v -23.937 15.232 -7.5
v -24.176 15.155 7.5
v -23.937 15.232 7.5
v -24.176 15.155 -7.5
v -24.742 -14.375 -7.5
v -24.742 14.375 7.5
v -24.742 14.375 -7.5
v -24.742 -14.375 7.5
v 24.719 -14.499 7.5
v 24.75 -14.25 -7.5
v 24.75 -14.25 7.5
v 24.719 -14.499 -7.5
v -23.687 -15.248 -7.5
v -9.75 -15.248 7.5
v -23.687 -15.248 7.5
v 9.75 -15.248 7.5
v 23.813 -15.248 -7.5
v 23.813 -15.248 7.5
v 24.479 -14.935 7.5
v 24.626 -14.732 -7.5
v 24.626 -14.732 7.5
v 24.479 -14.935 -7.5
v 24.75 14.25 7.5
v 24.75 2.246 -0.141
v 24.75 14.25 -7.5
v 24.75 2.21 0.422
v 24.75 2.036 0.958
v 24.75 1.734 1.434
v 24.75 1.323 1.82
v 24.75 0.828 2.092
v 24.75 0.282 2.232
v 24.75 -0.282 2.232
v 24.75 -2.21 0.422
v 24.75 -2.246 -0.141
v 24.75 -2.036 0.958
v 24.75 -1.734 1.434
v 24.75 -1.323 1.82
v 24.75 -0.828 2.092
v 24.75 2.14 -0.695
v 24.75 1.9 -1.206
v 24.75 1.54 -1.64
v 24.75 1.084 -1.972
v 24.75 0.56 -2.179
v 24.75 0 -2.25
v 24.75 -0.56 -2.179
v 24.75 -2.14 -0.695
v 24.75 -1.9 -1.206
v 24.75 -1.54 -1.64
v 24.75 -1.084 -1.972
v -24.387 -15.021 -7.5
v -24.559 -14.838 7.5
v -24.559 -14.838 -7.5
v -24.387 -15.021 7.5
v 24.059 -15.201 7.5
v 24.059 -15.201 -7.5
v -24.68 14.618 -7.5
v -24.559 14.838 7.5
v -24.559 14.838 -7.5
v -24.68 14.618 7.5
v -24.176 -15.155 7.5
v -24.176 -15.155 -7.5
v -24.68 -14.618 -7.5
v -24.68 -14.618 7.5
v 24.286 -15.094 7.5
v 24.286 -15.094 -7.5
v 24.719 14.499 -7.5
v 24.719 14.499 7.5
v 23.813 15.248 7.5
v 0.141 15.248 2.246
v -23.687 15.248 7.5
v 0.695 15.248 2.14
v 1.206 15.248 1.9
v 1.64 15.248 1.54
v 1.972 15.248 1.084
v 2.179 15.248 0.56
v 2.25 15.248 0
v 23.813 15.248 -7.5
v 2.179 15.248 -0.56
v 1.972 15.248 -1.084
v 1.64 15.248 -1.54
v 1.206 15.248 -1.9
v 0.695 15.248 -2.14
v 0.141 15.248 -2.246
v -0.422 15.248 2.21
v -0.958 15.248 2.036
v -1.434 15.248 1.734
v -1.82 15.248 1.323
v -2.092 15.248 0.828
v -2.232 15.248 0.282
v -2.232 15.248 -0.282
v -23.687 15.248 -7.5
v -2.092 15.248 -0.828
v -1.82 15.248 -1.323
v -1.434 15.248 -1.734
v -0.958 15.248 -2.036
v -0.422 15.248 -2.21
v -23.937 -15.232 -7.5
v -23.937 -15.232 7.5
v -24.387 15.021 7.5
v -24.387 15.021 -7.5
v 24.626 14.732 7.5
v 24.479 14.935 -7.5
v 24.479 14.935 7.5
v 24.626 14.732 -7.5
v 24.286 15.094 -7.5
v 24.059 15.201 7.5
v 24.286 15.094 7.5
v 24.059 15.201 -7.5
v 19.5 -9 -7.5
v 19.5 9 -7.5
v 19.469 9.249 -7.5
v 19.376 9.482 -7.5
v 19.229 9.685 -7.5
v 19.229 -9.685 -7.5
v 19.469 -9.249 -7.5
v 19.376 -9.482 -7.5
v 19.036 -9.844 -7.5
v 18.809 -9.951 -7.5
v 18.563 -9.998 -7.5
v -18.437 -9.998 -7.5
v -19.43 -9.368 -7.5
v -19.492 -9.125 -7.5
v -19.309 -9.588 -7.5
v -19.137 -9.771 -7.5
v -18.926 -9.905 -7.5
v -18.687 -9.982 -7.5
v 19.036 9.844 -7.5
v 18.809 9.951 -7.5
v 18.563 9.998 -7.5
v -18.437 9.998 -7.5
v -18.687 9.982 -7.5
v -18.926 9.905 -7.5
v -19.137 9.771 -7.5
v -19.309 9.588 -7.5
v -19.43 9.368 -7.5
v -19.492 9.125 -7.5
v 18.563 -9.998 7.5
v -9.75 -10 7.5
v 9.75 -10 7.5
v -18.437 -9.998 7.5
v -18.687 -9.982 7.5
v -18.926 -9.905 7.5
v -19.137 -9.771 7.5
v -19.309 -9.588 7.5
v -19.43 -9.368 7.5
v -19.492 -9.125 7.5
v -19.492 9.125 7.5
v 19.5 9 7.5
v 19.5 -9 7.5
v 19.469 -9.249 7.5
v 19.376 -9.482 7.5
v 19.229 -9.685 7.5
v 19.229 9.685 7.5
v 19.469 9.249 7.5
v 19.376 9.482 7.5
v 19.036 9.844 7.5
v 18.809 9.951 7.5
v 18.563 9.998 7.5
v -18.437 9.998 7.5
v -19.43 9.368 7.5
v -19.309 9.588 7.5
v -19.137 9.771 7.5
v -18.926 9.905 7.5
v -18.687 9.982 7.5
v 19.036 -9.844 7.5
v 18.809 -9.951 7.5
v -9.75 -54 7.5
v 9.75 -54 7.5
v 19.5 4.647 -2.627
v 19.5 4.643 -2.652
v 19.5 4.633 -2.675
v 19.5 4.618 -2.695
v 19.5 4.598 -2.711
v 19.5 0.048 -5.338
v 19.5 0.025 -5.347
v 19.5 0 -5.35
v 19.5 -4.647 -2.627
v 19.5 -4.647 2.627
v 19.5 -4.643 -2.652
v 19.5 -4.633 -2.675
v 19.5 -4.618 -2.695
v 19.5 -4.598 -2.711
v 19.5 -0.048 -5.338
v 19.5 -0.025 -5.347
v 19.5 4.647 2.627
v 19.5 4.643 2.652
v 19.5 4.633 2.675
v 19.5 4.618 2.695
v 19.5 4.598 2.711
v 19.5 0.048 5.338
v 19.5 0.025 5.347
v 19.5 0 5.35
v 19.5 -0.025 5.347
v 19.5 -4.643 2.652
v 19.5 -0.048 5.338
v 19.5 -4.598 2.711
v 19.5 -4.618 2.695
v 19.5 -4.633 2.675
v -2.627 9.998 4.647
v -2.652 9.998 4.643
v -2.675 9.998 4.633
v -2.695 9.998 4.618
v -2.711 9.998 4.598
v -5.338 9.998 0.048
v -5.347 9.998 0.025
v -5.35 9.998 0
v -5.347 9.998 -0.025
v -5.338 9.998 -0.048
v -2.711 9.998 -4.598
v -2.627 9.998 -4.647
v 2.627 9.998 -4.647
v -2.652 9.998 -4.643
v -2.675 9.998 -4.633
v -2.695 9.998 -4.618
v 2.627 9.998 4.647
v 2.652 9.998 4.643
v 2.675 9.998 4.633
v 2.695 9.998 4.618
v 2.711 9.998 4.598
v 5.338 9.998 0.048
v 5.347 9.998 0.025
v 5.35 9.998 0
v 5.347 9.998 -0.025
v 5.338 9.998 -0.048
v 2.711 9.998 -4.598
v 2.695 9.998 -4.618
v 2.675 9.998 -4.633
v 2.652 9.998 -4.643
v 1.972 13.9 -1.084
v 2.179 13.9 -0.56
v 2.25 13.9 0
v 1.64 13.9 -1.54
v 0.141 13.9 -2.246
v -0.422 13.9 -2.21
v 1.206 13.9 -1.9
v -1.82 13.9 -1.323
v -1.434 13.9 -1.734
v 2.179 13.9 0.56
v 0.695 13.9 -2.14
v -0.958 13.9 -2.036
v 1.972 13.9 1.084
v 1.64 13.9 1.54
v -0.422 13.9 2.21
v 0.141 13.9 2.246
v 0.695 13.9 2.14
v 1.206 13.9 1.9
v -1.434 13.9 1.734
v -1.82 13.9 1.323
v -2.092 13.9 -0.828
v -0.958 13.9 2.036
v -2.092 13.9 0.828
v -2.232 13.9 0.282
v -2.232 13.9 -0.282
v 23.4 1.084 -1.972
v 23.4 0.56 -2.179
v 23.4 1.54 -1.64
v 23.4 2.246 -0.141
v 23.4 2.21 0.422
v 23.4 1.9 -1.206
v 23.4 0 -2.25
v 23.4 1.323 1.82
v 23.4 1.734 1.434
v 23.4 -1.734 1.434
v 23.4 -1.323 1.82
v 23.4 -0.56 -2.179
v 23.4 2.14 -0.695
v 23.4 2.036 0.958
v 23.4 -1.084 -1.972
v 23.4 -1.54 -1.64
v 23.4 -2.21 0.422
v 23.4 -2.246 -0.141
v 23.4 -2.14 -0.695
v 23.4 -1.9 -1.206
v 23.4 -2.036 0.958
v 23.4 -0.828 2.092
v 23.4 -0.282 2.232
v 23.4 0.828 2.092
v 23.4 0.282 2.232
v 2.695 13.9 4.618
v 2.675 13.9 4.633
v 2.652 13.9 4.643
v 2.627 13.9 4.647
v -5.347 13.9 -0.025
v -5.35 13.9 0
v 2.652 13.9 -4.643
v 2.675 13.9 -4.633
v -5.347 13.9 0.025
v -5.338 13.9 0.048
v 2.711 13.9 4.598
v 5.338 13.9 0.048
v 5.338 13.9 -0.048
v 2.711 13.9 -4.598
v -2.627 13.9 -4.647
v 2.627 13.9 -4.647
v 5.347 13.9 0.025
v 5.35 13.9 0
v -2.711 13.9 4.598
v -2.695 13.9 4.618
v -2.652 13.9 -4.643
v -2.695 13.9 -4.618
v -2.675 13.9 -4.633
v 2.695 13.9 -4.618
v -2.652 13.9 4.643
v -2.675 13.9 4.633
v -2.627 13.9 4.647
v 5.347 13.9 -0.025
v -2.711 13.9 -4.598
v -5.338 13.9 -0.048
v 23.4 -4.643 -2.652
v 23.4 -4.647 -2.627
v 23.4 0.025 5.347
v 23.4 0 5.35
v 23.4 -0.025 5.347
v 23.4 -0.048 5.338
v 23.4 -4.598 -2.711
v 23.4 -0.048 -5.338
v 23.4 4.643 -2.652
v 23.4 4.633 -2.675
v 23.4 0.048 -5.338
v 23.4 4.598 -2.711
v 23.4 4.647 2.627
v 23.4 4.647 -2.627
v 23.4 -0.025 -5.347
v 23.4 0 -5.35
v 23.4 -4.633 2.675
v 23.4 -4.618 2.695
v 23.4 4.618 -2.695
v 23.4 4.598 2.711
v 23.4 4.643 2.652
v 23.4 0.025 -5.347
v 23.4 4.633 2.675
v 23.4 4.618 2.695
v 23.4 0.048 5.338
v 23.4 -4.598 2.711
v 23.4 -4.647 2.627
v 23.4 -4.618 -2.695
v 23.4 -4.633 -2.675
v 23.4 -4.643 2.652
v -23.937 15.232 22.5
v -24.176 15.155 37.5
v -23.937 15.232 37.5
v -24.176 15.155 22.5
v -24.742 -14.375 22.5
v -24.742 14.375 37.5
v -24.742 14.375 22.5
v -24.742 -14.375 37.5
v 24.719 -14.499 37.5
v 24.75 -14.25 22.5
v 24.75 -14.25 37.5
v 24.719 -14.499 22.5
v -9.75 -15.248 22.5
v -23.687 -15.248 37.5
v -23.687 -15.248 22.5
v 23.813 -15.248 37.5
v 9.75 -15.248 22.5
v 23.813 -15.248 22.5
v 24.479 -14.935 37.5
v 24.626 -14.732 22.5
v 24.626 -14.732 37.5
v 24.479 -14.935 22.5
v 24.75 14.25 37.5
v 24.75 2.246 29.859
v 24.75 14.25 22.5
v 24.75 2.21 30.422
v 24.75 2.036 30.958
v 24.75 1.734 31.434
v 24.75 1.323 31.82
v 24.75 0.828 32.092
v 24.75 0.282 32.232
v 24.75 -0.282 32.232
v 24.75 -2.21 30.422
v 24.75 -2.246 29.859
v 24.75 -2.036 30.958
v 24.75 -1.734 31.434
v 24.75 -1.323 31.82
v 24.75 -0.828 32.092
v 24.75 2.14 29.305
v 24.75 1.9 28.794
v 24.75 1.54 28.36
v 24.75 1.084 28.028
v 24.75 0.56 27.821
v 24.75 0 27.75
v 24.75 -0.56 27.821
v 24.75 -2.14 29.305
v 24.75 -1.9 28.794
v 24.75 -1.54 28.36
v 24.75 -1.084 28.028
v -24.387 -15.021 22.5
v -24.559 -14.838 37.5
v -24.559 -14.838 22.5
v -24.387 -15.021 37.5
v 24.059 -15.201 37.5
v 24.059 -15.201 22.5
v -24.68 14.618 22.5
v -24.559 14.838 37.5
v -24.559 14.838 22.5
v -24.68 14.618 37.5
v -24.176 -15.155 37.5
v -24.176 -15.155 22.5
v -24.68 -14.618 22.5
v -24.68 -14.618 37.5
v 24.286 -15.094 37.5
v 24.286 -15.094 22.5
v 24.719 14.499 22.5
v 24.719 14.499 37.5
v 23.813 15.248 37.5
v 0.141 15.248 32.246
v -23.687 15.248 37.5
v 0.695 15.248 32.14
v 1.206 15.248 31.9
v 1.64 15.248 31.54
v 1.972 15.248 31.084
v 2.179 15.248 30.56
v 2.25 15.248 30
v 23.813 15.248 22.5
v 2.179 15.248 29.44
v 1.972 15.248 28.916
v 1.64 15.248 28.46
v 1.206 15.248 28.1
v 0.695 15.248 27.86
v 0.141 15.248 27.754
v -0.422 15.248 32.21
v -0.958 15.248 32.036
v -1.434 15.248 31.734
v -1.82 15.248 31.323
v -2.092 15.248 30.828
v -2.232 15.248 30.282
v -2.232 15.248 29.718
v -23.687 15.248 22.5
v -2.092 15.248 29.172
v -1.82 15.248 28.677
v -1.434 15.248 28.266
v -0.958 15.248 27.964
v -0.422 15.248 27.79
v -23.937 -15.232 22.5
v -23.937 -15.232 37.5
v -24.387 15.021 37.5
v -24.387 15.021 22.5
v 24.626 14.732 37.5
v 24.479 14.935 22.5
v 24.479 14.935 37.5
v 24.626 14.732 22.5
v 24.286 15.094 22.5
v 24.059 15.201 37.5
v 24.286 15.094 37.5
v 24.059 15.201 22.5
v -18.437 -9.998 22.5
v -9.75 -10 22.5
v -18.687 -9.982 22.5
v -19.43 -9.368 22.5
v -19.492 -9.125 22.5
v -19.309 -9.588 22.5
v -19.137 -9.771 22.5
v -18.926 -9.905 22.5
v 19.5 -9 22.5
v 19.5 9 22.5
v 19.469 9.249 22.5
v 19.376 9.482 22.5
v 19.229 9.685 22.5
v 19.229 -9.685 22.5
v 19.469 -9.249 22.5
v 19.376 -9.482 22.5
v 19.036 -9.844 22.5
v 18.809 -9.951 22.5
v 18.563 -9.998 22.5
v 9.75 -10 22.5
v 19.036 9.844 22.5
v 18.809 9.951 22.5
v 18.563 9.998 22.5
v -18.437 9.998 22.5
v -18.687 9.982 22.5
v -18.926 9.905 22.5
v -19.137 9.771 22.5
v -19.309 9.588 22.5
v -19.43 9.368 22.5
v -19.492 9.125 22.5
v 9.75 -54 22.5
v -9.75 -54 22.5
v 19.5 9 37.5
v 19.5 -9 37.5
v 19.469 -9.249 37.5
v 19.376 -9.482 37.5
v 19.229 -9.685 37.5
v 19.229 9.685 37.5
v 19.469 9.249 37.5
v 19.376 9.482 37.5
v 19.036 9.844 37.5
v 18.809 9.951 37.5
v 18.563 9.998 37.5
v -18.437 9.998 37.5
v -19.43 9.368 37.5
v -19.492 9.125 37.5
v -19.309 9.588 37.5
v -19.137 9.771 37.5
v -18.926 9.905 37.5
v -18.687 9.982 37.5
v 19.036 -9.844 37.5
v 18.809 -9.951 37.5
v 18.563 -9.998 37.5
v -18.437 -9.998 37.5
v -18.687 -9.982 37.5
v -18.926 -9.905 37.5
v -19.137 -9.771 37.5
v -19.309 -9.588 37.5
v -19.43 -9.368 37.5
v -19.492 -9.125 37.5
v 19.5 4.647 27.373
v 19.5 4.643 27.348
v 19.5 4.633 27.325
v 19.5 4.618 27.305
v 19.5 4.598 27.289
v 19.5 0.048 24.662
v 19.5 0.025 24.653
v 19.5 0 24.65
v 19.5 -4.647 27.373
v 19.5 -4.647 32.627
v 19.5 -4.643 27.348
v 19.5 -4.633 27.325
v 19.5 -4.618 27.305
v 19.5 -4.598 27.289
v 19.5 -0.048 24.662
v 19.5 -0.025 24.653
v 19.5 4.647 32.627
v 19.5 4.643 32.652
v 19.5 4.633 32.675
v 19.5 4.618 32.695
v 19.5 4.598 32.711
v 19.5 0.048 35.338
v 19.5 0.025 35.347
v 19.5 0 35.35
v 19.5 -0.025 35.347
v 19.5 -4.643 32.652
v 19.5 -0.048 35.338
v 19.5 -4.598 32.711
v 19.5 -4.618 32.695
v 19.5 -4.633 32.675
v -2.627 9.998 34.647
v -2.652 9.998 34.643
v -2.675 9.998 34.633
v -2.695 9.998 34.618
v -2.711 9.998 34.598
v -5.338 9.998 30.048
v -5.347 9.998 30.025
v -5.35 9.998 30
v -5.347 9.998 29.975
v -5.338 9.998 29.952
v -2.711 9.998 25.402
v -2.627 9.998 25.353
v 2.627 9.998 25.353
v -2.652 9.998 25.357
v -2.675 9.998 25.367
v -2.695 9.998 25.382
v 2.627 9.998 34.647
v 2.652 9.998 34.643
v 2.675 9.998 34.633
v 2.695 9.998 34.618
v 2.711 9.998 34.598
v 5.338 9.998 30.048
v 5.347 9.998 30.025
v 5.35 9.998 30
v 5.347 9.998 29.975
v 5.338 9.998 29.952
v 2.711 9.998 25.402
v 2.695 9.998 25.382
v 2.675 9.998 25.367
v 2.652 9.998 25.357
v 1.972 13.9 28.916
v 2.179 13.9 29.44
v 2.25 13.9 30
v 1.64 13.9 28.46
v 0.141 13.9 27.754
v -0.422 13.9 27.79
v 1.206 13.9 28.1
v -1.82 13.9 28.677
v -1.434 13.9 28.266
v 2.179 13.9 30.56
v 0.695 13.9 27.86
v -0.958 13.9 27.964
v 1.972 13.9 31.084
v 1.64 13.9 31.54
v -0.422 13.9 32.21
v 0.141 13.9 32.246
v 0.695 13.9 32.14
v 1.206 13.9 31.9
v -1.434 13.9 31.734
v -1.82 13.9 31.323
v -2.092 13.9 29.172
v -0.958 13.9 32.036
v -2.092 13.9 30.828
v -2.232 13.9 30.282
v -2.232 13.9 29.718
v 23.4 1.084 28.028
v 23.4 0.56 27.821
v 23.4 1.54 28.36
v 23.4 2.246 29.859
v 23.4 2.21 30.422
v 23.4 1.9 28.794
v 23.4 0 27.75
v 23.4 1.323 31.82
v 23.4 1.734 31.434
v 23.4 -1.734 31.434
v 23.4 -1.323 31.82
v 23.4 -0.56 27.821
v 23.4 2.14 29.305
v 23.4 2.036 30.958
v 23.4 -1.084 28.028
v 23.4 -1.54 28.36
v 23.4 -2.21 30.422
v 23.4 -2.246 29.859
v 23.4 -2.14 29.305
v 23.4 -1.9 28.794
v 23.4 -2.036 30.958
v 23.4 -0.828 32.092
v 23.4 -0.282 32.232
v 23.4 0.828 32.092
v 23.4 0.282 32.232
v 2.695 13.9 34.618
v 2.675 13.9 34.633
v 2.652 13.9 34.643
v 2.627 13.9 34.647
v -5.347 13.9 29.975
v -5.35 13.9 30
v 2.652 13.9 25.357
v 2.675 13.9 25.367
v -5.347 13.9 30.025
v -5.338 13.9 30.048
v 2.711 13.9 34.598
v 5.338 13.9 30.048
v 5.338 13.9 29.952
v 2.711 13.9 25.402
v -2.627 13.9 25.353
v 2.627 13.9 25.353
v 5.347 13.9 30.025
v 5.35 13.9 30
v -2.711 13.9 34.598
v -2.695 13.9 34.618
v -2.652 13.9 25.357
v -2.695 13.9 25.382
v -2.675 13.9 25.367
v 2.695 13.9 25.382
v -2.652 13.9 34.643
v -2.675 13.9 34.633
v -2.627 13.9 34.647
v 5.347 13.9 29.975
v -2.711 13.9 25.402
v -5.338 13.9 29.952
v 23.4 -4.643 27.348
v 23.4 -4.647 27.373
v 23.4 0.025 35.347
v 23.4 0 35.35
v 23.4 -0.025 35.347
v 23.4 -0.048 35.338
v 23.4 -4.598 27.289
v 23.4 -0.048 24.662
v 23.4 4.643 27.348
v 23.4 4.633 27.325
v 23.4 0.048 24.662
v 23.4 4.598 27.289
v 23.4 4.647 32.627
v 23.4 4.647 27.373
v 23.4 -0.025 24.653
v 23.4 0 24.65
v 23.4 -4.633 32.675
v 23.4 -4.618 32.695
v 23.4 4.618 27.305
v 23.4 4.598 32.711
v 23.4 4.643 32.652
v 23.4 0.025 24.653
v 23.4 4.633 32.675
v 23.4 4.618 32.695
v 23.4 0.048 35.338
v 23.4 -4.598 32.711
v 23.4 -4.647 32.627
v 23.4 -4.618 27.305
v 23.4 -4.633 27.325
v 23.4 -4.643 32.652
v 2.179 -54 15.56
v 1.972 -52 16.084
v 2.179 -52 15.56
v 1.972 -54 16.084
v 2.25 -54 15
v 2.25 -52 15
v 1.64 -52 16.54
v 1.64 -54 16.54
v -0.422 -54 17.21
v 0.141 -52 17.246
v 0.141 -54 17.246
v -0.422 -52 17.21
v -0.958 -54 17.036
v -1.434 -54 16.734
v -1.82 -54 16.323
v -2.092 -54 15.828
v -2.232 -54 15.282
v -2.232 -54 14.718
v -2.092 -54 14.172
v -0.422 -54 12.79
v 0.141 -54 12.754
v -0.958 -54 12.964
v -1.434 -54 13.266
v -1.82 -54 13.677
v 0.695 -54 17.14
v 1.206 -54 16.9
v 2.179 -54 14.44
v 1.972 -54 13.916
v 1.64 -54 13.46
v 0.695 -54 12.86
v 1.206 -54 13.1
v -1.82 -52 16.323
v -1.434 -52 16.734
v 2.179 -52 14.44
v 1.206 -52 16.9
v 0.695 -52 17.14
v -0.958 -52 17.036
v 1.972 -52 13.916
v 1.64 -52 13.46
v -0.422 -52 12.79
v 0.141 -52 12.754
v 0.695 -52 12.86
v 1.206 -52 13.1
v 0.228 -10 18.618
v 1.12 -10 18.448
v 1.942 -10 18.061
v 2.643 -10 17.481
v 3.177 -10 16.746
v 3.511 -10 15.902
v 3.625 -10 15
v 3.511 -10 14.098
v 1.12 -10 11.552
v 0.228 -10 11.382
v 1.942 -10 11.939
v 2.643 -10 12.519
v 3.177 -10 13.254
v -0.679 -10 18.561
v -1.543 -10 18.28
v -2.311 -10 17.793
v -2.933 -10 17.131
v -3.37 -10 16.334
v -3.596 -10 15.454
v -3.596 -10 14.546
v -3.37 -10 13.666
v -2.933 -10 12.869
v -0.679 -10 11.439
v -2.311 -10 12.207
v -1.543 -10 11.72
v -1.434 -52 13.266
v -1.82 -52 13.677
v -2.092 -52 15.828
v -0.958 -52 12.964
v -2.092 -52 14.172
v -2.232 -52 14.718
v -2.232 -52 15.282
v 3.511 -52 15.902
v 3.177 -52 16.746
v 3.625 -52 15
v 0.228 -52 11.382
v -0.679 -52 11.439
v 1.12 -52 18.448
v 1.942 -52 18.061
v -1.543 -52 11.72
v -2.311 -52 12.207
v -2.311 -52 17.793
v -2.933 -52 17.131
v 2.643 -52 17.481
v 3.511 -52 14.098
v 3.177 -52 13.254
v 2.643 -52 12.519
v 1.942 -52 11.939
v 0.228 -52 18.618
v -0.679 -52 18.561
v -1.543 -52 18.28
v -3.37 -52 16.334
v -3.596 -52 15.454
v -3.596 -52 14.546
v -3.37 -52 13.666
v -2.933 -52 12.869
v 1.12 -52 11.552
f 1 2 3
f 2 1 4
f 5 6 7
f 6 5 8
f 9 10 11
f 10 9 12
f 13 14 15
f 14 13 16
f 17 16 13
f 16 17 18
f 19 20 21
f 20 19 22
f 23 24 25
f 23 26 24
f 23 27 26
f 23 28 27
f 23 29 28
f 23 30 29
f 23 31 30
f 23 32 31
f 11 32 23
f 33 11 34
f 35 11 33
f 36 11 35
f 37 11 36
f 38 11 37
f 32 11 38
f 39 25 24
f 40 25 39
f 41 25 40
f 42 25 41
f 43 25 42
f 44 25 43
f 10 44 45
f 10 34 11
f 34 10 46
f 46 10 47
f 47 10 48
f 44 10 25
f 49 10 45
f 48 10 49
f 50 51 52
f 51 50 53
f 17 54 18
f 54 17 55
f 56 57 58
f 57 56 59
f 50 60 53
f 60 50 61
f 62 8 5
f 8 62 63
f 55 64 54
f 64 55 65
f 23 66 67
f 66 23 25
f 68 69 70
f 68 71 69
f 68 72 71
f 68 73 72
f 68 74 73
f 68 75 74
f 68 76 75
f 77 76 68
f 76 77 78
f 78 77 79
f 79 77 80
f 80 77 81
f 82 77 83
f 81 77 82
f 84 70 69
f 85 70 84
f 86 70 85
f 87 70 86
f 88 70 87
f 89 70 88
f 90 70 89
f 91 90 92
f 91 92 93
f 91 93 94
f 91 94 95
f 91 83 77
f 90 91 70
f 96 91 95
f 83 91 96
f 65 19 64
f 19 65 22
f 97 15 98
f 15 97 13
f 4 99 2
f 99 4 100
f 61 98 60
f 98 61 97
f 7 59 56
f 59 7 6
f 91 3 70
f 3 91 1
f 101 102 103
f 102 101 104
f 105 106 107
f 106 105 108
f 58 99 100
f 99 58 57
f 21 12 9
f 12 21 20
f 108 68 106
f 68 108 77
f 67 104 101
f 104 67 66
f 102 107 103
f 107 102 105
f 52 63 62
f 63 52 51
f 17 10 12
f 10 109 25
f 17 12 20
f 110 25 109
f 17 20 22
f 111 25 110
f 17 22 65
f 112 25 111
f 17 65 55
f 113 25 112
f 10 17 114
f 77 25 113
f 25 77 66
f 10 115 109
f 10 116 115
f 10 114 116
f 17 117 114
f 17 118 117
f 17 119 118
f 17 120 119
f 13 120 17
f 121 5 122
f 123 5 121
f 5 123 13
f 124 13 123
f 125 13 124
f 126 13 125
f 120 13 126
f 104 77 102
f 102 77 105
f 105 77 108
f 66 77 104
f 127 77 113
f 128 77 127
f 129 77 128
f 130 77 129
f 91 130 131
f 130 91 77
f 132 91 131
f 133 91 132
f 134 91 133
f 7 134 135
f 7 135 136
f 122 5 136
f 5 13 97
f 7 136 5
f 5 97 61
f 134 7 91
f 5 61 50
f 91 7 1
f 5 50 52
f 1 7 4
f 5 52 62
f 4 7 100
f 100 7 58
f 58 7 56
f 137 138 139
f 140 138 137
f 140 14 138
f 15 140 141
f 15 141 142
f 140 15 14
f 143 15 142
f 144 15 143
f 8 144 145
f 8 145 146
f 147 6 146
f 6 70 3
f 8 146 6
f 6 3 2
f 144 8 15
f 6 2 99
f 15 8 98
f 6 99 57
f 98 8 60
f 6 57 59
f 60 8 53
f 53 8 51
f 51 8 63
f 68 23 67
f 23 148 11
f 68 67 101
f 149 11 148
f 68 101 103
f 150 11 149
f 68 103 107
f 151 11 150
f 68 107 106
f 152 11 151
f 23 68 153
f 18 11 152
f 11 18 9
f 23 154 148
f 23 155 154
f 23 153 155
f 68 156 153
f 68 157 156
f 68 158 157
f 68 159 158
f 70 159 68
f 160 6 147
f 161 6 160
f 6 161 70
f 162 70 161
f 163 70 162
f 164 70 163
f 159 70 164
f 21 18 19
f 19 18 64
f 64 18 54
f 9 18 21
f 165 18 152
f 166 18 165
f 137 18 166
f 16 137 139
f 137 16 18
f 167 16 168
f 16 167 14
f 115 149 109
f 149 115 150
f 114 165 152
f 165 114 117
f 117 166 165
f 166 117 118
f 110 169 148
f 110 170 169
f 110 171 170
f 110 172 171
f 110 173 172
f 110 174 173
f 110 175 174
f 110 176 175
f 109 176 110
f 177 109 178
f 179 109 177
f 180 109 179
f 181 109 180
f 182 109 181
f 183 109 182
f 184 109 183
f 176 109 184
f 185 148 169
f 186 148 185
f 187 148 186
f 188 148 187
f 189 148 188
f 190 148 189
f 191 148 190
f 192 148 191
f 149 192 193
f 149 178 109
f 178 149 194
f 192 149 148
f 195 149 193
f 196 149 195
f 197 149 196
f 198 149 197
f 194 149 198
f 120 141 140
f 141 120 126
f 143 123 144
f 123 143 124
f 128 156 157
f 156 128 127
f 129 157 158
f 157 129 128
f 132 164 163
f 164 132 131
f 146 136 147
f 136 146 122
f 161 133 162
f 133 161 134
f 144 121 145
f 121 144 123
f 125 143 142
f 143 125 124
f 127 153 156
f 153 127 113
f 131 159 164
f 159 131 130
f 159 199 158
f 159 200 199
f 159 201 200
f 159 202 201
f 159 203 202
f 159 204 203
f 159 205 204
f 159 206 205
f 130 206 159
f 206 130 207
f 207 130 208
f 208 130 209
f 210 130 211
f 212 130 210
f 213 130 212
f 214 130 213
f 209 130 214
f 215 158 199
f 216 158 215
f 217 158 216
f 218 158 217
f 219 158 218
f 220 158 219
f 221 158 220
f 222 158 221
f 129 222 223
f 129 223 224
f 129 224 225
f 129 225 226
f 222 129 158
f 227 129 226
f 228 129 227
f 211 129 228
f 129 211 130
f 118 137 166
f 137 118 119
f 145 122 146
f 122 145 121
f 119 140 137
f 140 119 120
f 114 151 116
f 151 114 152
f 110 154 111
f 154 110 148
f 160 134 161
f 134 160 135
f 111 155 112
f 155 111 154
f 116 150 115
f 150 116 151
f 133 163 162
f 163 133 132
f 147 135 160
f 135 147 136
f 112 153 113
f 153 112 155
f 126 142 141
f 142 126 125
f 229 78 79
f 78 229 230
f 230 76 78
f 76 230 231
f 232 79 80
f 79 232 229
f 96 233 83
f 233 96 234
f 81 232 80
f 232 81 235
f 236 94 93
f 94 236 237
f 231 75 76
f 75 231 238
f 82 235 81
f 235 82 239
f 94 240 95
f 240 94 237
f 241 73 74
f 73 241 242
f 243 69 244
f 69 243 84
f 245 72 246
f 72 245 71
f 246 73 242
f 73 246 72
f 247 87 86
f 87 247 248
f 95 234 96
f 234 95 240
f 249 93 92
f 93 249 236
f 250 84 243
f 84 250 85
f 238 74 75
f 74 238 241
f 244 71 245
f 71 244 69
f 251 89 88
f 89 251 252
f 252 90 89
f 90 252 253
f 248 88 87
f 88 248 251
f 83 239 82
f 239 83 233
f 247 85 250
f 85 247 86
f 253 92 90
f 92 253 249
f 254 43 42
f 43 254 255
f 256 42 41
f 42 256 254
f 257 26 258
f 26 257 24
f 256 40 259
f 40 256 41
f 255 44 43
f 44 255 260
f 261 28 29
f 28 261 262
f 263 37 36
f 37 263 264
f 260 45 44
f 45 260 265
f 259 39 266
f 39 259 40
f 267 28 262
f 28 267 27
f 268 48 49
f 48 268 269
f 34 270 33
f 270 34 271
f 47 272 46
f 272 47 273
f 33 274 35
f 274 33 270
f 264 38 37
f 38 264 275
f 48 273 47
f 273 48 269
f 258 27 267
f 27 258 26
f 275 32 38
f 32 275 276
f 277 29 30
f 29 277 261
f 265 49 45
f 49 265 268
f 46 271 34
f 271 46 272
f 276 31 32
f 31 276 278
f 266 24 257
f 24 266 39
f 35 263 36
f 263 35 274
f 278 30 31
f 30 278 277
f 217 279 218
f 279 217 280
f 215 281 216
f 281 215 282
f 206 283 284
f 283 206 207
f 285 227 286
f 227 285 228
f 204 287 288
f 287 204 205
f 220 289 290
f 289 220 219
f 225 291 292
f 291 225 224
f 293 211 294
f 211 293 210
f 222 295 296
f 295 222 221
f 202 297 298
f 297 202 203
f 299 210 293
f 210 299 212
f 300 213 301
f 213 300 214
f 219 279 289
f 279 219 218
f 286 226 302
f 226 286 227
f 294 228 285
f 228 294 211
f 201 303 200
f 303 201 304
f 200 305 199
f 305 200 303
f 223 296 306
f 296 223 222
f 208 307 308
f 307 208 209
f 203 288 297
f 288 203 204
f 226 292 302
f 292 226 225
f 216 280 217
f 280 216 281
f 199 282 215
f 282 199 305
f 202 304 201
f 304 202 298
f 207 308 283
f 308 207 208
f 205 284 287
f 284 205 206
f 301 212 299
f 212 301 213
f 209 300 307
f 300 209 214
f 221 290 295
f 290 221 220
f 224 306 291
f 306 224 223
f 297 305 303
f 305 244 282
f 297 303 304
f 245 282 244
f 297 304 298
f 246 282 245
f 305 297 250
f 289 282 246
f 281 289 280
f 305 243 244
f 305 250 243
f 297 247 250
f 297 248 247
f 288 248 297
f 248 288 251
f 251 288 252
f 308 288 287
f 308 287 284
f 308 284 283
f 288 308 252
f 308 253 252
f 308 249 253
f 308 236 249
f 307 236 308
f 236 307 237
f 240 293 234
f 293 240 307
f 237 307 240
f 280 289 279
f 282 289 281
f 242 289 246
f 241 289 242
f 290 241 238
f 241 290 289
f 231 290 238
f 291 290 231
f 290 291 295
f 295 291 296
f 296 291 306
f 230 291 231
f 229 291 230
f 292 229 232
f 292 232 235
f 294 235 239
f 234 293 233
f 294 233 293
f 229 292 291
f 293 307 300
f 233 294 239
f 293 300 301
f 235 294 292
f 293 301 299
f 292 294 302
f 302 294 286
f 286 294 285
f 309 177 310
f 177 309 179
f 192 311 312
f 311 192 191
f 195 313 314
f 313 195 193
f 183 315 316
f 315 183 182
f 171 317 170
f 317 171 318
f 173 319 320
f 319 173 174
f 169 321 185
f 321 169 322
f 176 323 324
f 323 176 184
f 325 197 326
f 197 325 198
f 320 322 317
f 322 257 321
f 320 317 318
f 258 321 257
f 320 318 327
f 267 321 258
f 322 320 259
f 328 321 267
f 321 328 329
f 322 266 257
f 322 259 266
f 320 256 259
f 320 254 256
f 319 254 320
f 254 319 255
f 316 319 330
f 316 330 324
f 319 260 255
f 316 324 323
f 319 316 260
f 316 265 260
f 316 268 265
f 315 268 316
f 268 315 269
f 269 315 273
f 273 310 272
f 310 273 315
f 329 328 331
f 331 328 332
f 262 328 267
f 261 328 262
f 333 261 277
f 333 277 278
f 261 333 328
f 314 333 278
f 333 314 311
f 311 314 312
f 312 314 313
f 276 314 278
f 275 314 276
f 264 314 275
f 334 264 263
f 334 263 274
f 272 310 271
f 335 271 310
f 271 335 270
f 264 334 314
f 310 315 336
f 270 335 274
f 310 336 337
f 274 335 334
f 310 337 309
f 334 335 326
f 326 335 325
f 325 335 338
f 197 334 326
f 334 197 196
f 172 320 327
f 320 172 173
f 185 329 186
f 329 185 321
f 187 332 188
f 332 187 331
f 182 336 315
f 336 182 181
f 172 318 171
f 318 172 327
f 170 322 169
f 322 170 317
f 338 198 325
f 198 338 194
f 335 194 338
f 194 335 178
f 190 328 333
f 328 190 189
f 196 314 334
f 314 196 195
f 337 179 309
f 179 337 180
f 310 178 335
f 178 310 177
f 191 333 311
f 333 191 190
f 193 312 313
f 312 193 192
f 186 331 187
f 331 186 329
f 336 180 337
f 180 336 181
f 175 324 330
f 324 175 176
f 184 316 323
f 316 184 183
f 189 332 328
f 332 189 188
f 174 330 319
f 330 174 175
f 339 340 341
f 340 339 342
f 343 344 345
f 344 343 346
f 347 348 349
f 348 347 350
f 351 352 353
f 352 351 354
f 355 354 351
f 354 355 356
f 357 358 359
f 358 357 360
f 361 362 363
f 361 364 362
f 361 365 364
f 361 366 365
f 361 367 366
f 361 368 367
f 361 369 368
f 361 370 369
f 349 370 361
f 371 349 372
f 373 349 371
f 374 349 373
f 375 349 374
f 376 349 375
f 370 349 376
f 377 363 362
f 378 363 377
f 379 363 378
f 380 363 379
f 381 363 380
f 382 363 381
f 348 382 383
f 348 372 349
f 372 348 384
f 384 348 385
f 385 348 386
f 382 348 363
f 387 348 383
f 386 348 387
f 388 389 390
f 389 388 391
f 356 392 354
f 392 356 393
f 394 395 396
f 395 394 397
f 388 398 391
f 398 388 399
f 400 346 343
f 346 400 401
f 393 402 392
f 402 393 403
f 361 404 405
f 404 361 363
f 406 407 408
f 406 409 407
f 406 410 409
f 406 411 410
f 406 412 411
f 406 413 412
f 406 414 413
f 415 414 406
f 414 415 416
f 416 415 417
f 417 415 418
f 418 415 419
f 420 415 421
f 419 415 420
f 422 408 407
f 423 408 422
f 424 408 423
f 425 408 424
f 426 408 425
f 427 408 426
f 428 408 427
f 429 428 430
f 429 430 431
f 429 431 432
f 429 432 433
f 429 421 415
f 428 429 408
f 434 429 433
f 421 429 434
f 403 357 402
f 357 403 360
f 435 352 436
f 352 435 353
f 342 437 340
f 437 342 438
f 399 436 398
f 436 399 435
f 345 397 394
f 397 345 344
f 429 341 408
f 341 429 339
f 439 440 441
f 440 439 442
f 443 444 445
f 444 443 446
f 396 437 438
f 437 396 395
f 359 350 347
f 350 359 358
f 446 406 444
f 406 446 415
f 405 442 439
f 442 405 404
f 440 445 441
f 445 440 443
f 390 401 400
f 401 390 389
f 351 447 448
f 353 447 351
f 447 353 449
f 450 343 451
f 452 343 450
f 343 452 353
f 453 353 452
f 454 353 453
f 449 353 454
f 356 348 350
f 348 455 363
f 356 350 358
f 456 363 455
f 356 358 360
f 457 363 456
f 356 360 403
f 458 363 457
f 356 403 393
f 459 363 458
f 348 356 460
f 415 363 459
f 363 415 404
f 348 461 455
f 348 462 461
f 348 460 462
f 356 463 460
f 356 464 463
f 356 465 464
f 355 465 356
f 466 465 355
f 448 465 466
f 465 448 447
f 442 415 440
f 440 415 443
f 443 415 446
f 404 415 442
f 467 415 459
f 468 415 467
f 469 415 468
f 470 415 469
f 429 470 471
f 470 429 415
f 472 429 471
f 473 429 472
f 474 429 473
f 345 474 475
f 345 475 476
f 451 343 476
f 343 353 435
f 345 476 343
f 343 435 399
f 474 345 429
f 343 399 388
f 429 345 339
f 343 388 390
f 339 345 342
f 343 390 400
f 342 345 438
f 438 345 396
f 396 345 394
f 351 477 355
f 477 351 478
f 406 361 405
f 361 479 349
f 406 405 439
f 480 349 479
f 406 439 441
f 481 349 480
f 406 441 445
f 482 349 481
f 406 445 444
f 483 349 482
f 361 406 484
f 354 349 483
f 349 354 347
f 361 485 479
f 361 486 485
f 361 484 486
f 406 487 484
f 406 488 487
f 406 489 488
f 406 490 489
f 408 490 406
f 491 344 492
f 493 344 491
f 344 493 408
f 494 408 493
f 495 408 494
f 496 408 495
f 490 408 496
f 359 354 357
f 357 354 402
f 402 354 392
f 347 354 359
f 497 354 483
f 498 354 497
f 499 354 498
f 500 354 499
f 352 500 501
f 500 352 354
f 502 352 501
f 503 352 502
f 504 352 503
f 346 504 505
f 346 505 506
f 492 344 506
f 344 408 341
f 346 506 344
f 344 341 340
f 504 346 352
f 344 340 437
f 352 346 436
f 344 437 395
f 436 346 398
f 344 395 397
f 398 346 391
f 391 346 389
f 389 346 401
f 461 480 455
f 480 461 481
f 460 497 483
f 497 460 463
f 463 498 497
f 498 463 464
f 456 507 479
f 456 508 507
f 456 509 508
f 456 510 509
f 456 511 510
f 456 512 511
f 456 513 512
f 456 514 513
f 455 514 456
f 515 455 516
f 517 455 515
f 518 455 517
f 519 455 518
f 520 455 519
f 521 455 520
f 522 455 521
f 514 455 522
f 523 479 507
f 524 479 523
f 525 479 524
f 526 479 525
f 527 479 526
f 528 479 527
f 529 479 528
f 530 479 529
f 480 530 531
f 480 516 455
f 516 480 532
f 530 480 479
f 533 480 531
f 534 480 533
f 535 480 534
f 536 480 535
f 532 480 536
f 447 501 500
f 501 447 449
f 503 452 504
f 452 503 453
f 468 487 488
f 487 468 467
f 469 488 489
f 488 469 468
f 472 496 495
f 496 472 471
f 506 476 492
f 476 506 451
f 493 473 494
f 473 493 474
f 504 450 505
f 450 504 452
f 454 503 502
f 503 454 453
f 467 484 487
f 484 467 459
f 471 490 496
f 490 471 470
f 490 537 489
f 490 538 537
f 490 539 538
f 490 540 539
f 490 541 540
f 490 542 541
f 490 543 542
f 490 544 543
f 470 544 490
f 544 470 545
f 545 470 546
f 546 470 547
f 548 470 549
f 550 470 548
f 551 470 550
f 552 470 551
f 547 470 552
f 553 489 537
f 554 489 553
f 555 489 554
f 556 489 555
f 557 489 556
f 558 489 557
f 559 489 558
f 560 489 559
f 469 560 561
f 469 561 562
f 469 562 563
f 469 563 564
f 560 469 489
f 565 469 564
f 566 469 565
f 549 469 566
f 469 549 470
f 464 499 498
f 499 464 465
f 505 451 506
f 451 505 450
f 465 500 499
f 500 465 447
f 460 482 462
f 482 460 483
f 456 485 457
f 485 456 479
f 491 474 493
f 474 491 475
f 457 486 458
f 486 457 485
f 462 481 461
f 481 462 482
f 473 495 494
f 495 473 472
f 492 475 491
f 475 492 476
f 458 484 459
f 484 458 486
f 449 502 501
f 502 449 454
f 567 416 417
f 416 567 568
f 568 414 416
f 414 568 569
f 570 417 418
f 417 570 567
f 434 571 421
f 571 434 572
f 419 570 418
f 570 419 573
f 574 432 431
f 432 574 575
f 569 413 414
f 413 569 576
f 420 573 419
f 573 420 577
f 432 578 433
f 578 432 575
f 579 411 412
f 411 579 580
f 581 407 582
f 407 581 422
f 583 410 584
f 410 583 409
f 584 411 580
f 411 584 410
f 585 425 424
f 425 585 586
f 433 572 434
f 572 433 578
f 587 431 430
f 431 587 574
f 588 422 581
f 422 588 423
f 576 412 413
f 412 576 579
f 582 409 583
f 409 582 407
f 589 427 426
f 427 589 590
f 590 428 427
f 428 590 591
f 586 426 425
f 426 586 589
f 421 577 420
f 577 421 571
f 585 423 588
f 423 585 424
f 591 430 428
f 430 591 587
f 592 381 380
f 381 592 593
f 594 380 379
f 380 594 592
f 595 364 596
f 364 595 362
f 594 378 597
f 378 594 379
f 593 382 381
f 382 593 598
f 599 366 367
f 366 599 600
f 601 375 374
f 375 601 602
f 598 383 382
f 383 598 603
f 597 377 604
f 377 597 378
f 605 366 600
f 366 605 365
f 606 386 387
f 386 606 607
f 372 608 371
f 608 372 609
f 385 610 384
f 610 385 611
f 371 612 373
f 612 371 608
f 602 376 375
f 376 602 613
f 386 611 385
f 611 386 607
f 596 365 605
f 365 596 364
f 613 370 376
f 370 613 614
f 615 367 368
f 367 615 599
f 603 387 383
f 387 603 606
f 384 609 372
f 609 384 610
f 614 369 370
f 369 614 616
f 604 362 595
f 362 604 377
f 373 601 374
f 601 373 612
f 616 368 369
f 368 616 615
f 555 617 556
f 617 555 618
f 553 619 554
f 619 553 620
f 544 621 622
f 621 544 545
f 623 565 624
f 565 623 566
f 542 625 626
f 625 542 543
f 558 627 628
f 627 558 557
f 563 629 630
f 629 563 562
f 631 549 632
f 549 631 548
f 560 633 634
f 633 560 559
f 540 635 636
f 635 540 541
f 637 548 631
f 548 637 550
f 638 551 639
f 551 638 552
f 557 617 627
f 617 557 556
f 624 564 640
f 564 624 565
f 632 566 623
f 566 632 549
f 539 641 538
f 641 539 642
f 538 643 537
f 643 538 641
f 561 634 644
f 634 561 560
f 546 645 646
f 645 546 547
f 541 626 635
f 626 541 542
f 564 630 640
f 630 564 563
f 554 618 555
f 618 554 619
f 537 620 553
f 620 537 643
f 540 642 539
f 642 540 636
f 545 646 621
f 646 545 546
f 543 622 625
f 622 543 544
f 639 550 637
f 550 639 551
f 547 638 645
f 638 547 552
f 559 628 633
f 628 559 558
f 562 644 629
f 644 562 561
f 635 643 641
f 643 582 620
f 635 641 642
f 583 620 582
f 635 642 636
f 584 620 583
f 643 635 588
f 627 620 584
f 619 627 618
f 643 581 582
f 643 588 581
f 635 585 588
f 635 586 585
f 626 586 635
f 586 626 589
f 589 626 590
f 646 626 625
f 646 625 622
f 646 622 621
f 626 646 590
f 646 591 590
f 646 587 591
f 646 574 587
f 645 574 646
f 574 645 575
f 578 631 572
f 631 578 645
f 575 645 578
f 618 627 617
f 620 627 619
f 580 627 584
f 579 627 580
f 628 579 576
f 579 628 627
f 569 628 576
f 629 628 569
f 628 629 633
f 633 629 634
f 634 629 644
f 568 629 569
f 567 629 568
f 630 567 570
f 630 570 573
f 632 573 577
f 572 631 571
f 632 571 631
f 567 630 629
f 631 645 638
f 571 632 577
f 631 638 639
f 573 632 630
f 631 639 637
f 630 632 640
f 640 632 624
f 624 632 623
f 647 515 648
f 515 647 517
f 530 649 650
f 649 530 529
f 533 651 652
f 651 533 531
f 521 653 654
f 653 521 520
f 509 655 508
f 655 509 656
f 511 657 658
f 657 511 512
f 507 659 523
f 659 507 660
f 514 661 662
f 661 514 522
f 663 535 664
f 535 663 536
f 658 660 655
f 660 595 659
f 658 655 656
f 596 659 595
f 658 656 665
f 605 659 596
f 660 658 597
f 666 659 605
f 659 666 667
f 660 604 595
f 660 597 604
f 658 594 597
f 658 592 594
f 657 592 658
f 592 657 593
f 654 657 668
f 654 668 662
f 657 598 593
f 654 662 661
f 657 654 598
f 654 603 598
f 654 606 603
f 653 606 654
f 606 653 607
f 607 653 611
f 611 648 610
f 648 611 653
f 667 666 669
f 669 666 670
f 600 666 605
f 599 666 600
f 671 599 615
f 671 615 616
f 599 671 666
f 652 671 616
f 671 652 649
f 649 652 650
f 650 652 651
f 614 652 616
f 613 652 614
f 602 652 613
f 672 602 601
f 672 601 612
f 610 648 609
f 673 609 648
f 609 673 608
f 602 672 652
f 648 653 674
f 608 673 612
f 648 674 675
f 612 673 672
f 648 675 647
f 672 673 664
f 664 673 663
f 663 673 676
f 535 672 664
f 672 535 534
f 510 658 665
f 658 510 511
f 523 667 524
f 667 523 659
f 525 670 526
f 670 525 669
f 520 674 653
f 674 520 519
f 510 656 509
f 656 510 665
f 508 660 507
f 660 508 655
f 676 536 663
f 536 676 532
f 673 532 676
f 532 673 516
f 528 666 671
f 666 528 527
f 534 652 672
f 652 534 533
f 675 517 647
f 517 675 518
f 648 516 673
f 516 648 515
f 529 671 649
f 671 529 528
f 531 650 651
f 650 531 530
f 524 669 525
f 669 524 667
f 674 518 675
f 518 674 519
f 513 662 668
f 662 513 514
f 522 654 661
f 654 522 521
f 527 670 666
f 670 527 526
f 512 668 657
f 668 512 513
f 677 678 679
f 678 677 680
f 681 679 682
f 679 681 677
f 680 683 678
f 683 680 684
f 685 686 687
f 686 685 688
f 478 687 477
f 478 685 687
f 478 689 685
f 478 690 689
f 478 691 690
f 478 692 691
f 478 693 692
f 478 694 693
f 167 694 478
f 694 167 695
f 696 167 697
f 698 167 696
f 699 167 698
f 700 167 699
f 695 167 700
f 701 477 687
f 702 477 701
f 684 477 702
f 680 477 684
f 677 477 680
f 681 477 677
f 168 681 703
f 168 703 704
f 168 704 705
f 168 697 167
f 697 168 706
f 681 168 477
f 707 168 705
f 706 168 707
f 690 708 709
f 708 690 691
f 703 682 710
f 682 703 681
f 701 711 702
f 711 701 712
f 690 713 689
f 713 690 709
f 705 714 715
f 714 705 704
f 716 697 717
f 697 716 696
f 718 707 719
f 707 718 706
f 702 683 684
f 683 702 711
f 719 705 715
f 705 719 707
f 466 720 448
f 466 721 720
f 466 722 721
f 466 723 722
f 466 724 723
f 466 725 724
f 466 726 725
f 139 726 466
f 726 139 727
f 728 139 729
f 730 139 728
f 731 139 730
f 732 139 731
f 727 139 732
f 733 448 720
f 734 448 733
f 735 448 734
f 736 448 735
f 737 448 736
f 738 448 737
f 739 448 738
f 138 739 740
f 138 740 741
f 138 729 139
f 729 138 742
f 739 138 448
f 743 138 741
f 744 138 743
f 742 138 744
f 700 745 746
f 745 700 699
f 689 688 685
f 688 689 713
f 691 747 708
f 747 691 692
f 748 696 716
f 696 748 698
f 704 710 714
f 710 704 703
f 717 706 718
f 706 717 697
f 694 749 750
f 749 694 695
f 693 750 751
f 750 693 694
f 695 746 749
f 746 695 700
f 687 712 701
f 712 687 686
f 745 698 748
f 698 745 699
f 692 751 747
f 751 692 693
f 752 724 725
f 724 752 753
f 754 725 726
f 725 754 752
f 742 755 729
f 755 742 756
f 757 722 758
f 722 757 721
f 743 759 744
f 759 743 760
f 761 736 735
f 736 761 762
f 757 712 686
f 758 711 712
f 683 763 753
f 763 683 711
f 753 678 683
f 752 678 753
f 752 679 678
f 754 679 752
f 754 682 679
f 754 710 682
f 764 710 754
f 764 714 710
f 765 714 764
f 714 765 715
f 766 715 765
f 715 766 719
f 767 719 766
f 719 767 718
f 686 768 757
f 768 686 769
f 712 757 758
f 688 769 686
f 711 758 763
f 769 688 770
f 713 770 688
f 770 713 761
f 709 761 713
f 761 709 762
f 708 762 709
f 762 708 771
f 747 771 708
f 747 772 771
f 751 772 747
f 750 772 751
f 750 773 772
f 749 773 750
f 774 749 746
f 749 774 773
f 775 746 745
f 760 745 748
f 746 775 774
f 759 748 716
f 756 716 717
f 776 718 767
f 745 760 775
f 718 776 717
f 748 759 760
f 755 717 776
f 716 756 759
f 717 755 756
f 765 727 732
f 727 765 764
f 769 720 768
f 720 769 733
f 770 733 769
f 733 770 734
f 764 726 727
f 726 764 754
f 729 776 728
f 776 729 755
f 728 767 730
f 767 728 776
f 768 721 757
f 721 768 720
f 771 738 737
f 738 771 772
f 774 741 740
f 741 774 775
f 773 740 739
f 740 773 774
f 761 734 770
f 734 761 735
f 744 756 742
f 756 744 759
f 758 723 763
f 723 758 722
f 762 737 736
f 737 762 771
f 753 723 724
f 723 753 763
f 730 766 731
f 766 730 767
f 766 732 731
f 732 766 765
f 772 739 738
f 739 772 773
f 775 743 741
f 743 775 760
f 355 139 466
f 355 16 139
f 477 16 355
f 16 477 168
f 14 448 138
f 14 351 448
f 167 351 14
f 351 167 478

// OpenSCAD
//
// ***********************************************************************
// Waveguide-holder parameterized design
// Patrick Thomas
// Spring 2022 Work-term
// ***********************************************************************
//

// Set number of fragments to higher values for smoother curved edges
$fn = 25;

// Helper functions 
module hex_generator(diameter, depth){
    //
    // Returns a hexagonal extrusion oriented normal to z=0 plane.
    // "diameter" is point-to-point, "depth" is length of extrusion,
    // and "tolerance" is an increased size due to cylinder radius.
    // A tolerance of diameter/5 is recommended for rounded corners. DO I NEED THIS?
    //
    let(number_of_cylinders = 6, radius = 0.1){
                    hull(){
                        // Encloses the below objects in mesh
                        for(i = [1:number_of_cylinders]){
                            rotate(i*360/number_of_cylinders)
                            translate([diameter/2,0,0])
                            cylinder(r=radius,h=depth);
                            }}}}
                            // Generates 6 cylinders of height = depth
                            // rotating each cylinder by 60 degrees ad
                            // translating each cylinder by diameter/2

module nut_generator(o_diameter, i_diameter, depth){
    //
    // Returns a hexagonal extrusion produced by hex_generator but
    // with a hole, made by a cylinder, so it resembles a hex nut.  
    // "o_diameter" is outer diameter of nut, measured point-to-point,
    // "i_diameter" is inner diameter of hole, and "depth" is 
    // length of extrusion. 
    // Useful parameters are nut_generator(10,4,3.3) for an 8-32 nut 
    //
    difference(){
        hex_generator(o_diameter, depth, o_diameter/20);
        cylinder(depth, i_diameter/2, i_diameter/2);}}

module screw_generator(h_diameter, t_diameter, h_depth, length){
    //
    // Returns union of two cylinders oriented normal to the z=0 plane.
    // Cylinders form a screw-like solid with head resting on z=0 plane.
    // "h_diameter" is diameter of head, t_diameter is diameter of thread,
    // "h_depth" is depth of the head, and "length" is total length of
    // screw (from the top of its head to bottom of its thread). 
    //
    union(){
        cylinder(length, t_diameter/2, t_diameter/2);
        cylinder(h_depth, h_diameter/2, h_diameter/2);}}

//         
module waveguide_holder(wg_height, wg_width, height)
    // 
    // Returns an object capable of supporting the waveguide of specified
    // height, "wg_height" and width, "wg_width" that supports mounting to
    // optical rod support via 8-32 screws. The waveguide is kept in place
    // using four concavities, each housing a hex nut which acts as the
    // complimentary thread for a nylon-tipped set screw. 
    //
    let(radius = 1, depth = 15, thickness = 5, separation = 30, number_of_posts = 1)
        // radius of cylinder used in minkowski sums to round corners, 
        // depth of part surrounding the waveguide,
        // thickess of part surrounding the waveguide, 
        // separation hole-to-hole of the supports holding waveguide + separation of adjacent posts,
        // number_of_posts informs how many iterations to do, recommended 1 or 2.
        {
            for(i = [0:number_of_posts]){
                translate([0,0,i*separation]) // Places multiple holders on either side of post
                    difference(){  
                        minkowski(){ // Build exterior cube with rounded corners
                            cube([wg_width+thickness*2-1.5, wg_height+thickness*2-1.5, depth/2], center = true);
                            cylinder(depth/2, radius, radius, center = true);}
                        minkowski(){ // Build interior cube with rounded corners, fitted to waveguide
                            cube([wg_width-2, wg_height-2, depth/2], center = true);
                            cylinder(depth/2, radius, radius, center = true);}
                        rotate([270,0,0]) // Creates set screw hole on top of waveguide holder
                            cylinder(wg_height/2+thickness+1,2.25,2.25, center = false);
                        rotate([0,90,0])  // Creates set screw hole on side of waveguide holder
                            cylinder(wg_width/2+thickness+1,2.25,2.25, center = false);
                        translate([0,wg_height/2-0.1,0])
                        rotate([270,0,0]) // Creates nut housing on upper-interior of waveguide holder   
                            hex_generator(10.5,4);
                        translate([wg_width/2-0.1,0,0])
                        rotate([0,90,0])  // Creates nut housing on side-interior of waveguide holder
                            hex_generator(10.5,4);}}
            for(i = [0:number_of_posts-1]){
            translate([0,-wg_height/2,separation/2+i*separation]) // Creates posts specified by number_of_posts
                difference(){
                    translate([0,-height/2,0])
                        cube([wg_width/2,height,separation-depth],center = true);
                    rotate([90,0,0])
                        screw_generator(7.25,4.5,height-2,height);}}}

waveguide_holder(20,39,101-9-38-20/2); //47.625    44 
